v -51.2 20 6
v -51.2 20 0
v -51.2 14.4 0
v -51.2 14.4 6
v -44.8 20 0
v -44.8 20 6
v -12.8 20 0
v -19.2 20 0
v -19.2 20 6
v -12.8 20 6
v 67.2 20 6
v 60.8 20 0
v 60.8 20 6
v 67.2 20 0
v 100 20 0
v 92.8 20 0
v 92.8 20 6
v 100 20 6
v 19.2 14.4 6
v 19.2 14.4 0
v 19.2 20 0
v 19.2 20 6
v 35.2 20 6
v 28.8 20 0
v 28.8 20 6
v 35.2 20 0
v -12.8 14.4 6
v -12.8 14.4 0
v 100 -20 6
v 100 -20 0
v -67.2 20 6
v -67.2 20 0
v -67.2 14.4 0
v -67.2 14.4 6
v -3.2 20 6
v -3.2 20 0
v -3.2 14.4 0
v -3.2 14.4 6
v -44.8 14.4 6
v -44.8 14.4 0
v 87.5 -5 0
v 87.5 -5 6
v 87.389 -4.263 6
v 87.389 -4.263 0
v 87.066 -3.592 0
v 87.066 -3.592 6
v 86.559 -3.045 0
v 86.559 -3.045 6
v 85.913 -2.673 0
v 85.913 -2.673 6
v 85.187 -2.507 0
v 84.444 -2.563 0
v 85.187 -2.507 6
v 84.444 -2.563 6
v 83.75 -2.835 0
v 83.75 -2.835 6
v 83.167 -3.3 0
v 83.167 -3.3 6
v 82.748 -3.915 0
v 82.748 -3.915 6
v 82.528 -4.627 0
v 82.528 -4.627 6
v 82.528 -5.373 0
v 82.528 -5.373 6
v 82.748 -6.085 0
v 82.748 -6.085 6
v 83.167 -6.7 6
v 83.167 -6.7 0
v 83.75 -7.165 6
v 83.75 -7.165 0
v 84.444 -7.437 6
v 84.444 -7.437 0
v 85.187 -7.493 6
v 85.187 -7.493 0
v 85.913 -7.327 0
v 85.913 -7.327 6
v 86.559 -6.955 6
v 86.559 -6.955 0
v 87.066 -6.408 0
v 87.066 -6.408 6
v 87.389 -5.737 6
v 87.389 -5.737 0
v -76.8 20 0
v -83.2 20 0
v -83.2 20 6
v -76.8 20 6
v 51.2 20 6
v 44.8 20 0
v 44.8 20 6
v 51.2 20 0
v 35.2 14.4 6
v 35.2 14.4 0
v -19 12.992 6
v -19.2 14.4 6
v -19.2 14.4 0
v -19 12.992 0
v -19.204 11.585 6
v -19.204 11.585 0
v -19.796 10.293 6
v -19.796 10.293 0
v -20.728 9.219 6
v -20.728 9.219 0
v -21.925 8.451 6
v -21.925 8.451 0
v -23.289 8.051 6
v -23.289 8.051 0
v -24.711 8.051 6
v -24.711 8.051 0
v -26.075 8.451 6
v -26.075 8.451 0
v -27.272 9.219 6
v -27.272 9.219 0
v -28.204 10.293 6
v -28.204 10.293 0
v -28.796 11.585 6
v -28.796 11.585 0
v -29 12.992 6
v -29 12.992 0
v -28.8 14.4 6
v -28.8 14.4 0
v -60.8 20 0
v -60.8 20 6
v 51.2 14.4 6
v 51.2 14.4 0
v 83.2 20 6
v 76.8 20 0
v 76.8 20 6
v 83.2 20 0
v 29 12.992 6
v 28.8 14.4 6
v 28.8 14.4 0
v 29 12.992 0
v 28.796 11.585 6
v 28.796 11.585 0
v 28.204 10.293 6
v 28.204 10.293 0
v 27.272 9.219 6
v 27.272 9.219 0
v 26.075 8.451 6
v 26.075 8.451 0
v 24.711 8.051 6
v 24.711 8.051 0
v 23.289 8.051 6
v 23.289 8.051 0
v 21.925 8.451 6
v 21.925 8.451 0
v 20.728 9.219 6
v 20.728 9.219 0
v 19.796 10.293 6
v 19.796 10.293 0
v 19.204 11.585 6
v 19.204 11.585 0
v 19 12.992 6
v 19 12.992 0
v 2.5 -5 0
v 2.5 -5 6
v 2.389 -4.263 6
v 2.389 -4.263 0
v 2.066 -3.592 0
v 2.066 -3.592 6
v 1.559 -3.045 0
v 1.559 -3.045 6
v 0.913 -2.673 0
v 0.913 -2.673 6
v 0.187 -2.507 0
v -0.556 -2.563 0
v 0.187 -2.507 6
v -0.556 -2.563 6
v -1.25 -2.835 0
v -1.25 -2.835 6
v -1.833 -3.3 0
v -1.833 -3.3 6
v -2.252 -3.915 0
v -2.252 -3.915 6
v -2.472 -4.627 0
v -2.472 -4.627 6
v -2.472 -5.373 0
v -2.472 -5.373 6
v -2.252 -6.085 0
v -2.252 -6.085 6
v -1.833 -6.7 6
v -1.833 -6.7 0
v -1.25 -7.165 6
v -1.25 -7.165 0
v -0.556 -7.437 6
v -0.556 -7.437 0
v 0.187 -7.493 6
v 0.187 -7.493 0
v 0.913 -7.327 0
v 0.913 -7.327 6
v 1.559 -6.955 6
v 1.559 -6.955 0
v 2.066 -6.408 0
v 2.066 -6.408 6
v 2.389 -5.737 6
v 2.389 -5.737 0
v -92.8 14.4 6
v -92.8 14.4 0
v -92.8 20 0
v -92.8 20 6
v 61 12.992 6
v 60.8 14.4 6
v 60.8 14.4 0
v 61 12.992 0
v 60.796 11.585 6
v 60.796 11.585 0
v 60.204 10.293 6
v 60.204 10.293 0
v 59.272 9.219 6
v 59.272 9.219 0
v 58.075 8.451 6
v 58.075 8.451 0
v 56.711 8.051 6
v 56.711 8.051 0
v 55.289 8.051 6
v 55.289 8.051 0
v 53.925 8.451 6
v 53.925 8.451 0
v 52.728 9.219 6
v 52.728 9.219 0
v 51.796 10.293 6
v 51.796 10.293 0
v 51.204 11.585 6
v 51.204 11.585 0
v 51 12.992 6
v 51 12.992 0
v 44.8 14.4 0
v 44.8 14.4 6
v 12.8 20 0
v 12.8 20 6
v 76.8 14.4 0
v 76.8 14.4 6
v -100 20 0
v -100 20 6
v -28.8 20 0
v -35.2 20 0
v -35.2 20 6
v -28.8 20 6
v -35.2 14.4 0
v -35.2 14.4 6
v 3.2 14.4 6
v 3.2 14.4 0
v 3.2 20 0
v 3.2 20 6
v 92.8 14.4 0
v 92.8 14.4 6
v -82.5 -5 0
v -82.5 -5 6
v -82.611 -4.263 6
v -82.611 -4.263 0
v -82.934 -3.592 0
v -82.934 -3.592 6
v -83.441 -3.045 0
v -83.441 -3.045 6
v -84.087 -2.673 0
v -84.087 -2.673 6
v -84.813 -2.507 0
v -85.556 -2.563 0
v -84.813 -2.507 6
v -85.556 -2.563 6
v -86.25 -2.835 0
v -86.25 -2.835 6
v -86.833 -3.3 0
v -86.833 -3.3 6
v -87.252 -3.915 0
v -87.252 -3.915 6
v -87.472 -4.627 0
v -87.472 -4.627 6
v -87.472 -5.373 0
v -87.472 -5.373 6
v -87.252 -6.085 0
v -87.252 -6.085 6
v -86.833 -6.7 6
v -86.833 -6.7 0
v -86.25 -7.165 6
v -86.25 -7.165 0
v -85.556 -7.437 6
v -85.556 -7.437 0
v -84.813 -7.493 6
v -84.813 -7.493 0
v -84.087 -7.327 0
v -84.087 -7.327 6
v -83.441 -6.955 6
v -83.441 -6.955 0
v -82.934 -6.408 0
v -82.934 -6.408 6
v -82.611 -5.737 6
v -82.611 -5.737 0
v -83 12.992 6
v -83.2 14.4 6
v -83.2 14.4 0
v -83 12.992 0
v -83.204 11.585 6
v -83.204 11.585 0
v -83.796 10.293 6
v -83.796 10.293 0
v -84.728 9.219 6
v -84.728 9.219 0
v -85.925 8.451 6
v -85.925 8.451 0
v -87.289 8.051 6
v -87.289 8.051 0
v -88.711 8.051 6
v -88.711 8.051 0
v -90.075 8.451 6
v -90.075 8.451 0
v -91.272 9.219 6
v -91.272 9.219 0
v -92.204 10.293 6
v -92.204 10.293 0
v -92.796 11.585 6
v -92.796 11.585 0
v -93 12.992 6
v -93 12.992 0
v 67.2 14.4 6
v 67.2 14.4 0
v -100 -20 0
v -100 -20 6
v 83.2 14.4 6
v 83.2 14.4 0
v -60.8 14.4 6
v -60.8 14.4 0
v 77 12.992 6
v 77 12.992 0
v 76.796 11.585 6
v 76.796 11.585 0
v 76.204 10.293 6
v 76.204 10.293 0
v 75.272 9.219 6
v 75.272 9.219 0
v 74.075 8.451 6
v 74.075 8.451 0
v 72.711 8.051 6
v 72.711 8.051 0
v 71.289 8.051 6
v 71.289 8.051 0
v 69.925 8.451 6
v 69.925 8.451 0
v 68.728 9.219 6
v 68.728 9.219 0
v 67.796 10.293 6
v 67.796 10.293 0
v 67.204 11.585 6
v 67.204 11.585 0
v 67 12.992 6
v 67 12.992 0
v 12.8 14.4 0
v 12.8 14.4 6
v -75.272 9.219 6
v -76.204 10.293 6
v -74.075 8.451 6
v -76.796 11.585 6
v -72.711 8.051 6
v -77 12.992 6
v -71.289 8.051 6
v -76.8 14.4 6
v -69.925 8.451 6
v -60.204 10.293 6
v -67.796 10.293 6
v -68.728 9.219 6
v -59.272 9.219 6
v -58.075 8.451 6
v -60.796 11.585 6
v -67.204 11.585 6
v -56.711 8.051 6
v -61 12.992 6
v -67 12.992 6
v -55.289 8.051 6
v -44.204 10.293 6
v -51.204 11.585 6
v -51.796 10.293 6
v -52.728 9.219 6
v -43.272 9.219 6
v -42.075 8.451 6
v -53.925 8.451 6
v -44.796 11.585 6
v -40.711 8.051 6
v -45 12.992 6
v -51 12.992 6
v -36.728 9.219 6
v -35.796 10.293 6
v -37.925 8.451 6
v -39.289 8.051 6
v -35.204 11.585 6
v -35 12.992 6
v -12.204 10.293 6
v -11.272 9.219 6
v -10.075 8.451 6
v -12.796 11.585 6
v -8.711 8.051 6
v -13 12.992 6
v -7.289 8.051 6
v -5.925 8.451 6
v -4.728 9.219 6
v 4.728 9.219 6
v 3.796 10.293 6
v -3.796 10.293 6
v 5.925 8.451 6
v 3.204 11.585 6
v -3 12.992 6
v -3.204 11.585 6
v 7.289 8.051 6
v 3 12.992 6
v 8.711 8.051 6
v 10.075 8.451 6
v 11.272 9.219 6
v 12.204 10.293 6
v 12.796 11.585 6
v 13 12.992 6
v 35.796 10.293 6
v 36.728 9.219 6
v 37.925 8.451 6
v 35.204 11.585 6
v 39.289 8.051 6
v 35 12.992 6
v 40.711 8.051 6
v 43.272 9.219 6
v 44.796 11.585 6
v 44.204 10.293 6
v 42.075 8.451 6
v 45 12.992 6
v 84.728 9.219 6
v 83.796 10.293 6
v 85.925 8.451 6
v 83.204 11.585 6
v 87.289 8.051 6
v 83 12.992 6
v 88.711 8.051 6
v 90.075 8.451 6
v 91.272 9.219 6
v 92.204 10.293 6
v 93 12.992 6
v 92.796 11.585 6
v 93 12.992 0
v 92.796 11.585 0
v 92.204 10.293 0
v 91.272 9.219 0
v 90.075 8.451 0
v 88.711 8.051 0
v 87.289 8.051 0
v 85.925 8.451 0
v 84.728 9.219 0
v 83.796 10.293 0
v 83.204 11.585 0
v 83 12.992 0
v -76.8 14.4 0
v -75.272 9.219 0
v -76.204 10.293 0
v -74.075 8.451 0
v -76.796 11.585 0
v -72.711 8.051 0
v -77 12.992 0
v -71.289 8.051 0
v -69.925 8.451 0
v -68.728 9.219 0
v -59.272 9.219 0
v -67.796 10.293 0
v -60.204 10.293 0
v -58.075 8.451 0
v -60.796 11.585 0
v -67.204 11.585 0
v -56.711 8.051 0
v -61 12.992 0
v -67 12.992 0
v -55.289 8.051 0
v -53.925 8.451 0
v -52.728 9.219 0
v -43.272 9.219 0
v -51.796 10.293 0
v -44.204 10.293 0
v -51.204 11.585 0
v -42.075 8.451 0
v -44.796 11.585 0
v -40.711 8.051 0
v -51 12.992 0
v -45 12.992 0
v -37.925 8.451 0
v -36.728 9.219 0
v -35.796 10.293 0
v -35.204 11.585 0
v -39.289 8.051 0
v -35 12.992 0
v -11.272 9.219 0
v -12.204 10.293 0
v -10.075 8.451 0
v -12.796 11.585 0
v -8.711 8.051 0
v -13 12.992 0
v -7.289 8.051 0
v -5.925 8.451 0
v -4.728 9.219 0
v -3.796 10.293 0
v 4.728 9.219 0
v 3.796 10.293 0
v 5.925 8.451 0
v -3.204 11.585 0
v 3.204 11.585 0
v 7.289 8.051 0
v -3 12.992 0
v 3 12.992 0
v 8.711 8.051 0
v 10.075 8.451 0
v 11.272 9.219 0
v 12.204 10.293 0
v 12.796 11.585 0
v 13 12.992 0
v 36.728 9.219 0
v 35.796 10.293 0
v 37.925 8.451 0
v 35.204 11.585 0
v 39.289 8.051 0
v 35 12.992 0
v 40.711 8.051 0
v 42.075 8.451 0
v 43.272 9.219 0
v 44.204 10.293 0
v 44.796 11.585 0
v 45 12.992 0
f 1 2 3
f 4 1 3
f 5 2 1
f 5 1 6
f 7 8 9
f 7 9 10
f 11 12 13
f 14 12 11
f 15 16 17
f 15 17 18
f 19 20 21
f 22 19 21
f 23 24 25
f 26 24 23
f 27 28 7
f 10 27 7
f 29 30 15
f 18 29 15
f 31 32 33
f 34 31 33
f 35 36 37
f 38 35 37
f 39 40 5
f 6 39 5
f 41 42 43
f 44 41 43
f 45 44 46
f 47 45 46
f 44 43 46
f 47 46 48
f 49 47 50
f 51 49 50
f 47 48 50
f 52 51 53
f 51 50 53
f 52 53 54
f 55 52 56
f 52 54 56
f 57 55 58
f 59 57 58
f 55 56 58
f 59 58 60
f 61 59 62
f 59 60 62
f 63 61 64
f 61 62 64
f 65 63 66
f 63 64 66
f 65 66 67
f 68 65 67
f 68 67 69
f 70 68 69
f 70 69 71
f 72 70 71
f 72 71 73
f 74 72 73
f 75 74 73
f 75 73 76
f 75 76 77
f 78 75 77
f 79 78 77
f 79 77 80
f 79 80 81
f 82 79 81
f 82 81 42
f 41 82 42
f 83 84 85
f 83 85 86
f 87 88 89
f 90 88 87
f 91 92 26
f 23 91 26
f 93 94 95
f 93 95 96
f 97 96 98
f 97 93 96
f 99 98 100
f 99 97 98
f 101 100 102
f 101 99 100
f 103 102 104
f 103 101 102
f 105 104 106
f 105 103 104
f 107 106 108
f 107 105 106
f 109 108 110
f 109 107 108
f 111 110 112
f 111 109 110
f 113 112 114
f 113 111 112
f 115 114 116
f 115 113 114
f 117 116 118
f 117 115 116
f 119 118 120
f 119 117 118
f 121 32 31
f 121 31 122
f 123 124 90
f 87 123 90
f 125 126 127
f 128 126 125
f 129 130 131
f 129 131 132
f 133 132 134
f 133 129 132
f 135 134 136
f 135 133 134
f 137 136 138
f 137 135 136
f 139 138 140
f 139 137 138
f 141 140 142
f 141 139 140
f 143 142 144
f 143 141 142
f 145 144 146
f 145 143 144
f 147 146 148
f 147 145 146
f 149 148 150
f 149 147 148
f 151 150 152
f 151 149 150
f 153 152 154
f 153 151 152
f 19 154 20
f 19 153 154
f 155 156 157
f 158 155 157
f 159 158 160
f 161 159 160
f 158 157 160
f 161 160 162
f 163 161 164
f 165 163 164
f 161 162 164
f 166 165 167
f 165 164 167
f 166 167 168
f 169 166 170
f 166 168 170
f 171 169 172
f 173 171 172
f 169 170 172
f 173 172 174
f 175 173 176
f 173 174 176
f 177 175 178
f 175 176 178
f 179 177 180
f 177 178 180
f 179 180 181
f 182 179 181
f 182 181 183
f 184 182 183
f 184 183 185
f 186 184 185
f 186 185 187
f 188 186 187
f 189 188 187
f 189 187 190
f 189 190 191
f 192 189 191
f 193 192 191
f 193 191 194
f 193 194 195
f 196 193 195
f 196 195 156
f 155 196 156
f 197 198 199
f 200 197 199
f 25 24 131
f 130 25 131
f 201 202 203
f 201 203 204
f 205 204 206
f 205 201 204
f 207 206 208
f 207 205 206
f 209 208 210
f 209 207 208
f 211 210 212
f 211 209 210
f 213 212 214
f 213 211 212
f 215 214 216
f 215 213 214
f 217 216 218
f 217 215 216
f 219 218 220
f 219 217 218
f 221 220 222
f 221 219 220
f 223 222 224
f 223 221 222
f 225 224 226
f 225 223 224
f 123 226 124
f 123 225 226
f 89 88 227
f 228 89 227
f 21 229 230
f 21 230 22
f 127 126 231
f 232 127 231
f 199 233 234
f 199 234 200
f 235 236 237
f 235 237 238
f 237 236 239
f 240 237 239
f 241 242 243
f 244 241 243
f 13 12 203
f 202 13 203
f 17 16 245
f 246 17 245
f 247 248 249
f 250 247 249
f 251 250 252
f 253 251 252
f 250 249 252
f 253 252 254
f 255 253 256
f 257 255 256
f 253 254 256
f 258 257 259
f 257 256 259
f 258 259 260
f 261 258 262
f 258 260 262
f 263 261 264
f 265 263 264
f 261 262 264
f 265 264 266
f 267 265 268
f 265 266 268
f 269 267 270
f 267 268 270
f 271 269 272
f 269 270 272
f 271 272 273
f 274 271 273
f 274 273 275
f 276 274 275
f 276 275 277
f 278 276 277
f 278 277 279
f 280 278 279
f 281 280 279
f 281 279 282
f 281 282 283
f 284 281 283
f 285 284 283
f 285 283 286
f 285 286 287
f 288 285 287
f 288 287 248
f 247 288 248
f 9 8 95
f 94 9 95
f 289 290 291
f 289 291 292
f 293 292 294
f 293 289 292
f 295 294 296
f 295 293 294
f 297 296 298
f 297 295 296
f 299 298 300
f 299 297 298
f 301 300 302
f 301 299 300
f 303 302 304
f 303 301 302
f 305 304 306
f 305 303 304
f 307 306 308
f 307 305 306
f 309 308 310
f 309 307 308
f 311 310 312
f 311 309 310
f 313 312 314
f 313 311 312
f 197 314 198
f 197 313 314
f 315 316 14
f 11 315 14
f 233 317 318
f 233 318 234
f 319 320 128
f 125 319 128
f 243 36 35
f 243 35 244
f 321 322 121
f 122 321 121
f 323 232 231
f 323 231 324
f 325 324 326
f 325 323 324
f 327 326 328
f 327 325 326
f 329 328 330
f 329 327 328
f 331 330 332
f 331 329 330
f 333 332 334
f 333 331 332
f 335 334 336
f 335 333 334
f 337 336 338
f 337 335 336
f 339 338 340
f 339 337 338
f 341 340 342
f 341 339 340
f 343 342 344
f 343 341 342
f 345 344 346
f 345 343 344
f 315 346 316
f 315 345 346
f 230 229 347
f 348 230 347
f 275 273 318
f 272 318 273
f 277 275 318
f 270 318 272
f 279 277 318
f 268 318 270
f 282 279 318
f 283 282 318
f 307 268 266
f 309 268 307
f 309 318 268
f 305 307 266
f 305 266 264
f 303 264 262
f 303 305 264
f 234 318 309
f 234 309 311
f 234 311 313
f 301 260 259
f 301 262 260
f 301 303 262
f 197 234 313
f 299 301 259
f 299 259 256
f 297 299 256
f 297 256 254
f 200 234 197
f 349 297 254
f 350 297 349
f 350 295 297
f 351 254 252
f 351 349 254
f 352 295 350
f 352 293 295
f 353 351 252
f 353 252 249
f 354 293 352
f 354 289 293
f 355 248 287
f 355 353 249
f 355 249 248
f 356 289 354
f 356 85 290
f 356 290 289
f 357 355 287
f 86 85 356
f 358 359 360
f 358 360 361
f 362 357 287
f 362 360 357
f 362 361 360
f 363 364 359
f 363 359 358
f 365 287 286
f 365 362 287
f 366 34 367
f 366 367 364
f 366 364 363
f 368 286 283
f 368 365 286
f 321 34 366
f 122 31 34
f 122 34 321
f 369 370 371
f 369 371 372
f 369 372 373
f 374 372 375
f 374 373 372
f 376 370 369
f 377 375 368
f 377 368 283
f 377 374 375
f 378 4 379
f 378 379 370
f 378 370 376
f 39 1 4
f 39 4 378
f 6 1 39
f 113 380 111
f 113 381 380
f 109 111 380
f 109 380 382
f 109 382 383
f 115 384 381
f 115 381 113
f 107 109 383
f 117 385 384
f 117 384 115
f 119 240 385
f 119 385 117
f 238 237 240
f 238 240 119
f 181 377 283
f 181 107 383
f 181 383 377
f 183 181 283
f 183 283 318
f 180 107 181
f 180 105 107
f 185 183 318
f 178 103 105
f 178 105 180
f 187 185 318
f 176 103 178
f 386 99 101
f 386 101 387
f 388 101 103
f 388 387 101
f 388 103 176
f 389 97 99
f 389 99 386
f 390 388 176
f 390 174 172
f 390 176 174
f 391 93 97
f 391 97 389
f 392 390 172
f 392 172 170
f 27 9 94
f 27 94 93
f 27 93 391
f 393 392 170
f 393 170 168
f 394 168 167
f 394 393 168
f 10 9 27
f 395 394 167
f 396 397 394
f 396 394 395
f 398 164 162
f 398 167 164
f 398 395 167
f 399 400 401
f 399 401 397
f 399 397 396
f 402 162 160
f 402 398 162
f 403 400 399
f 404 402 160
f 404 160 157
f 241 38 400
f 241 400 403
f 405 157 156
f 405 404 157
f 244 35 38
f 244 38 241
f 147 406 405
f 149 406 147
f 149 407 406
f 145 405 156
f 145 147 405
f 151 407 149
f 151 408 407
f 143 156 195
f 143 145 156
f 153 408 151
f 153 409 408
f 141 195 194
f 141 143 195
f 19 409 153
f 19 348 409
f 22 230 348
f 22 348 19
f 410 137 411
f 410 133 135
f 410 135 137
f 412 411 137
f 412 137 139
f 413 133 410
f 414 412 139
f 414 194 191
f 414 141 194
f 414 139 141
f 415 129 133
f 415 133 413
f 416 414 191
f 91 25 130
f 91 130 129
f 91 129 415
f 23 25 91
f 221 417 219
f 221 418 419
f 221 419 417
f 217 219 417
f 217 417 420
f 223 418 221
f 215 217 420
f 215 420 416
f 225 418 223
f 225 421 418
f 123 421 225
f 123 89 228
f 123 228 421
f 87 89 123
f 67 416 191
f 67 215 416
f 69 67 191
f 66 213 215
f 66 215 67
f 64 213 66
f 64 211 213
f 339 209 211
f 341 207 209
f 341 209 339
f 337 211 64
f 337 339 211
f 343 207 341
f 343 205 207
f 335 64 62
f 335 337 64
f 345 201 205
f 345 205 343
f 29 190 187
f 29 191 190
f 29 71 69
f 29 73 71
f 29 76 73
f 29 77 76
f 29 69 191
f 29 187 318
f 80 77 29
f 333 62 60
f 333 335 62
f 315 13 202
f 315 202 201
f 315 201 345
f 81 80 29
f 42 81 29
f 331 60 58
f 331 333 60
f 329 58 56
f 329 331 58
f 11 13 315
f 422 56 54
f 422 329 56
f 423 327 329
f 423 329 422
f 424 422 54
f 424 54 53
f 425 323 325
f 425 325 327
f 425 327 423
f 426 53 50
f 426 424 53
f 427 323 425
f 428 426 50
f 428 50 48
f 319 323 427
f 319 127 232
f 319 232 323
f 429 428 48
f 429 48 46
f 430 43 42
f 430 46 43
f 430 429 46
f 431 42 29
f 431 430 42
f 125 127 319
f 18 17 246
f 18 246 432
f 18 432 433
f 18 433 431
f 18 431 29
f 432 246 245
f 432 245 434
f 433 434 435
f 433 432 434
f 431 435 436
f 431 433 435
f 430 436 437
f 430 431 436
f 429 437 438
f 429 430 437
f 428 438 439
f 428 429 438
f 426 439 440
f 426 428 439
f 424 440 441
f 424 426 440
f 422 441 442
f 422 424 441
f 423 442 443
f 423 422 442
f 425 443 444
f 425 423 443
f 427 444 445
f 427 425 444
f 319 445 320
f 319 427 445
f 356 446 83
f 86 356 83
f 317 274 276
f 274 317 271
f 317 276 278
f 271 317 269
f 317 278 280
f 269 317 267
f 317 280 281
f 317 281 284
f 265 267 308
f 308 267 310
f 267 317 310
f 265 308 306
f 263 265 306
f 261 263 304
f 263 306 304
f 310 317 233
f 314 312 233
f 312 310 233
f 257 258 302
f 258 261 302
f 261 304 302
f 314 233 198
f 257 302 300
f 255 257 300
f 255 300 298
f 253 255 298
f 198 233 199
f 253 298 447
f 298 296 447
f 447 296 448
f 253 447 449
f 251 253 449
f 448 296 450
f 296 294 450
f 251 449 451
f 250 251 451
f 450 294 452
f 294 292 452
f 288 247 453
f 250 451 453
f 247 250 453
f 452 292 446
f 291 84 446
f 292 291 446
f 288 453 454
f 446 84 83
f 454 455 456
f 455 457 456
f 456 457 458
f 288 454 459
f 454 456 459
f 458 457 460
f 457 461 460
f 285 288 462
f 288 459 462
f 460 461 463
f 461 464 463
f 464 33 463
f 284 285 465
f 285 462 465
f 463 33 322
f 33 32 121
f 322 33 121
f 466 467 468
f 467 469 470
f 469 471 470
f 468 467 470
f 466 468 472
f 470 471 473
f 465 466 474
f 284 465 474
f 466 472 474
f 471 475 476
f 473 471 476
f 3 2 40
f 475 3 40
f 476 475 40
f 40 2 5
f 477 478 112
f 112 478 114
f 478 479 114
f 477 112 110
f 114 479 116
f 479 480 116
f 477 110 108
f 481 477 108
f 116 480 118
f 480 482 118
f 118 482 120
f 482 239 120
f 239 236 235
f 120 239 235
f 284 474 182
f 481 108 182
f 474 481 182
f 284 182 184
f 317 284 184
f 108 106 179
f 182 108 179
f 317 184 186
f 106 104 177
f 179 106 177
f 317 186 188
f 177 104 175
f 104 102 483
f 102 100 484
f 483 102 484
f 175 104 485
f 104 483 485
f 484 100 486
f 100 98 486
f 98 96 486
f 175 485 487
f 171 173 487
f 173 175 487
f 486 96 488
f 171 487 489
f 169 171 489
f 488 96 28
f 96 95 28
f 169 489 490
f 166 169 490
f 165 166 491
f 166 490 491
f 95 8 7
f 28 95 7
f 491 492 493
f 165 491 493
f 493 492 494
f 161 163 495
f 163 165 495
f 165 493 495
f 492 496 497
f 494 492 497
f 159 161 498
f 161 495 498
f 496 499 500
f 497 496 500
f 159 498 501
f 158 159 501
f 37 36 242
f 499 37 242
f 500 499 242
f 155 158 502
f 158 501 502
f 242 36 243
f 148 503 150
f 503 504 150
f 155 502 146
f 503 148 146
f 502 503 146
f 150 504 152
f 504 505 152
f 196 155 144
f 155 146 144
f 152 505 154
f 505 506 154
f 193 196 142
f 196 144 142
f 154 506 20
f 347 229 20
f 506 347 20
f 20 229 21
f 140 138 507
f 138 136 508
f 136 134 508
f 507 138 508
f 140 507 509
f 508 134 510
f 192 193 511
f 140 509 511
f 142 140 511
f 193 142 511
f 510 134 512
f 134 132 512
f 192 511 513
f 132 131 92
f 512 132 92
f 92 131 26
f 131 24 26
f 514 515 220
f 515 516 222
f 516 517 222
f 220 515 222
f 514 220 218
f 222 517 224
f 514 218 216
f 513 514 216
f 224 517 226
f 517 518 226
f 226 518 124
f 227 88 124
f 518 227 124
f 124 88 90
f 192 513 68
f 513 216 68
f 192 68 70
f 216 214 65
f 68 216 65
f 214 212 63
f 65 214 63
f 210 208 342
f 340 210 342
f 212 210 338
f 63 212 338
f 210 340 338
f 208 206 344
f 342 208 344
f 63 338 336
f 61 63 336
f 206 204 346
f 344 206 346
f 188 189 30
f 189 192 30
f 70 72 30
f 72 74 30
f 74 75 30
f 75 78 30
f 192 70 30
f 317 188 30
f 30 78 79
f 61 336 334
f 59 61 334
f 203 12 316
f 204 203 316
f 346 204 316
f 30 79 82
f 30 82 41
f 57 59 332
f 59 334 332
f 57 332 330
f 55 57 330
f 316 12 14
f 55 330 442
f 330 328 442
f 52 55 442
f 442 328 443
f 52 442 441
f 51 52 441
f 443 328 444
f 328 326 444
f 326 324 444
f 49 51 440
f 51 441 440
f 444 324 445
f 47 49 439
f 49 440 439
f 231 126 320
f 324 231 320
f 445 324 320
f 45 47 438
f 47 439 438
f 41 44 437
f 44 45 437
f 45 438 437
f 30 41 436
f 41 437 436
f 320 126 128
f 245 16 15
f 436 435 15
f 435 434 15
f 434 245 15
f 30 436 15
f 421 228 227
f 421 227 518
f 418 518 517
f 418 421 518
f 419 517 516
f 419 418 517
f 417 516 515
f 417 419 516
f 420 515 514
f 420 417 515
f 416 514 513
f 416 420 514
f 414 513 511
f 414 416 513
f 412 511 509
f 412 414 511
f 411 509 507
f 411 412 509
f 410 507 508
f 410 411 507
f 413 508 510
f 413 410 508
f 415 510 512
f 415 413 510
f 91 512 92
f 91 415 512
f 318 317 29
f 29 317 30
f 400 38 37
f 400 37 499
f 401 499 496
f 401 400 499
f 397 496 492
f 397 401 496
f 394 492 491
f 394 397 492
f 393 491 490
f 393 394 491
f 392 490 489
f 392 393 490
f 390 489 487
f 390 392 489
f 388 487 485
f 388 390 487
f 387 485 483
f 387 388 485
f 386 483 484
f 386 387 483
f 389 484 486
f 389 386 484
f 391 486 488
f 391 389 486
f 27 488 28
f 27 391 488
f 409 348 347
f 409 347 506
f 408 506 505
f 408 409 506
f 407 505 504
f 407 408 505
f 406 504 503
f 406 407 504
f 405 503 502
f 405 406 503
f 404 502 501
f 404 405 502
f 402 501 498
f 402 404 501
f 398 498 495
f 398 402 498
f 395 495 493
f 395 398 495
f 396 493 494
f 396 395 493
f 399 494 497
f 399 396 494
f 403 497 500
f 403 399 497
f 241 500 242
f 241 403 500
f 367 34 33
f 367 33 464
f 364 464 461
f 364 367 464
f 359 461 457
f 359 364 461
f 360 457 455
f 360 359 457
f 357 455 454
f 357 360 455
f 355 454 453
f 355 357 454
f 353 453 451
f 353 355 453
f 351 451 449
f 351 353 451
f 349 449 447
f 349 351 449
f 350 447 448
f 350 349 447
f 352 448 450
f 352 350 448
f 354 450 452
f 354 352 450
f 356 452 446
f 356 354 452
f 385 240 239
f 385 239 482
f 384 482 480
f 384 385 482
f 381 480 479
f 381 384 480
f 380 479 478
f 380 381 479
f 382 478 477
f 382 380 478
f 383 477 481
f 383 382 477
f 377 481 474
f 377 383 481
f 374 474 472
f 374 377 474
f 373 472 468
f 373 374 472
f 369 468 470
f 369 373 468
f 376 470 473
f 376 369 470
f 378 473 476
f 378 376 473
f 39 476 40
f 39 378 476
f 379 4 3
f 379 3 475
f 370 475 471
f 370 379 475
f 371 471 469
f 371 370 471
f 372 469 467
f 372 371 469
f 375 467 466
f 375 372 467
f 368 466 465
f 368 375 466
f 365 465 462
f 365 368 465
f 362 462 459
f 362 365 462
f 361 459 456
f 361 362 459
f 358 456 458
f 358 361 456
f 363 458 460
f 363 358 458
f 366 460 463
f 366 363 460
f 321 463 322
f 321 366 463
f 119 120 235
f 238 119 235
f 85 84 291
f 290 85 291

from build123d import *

# Parameters (mm, degrees)
ESQUISSE1_W                = 200
ESQUISSE1_H                = 40
BOSS_EXTRU_1_DEPTH         = 6
ENL_V_MAT_EXTRU_1_DEPTH    = 103.156742313
ESQUISSE3_R                = 2.5
ENL_V_MAT_EXTRU_2_DEPTH    = 103.156742313
R_P_TITION_LIN_AIRE1_COUNT = 12
R_P_TITION_LIN_AIRE1_PITCH = 16


with BuildPart() as part:
    # Esquisse1 → Boss.-Extru.1 (new body)
    with BuildSketch(Plane.XY):
        Rectangle(ESQUISSE1_W, ESQUISSE1_H)
    extrude(amount=BOSS_EXTRU_1_DEPTH)

    # Esquisse2 → Enlèv. mat.-Extru.1 (cut, through all)
    with BuildSketch(Plane.XY.offset(6)):
        with BuildLine():
            Line((-92.8, 14.4), (-92.8, 20))
            Line((-92.8, 20), (-83.2, 20))
            Line((-83.2, 20), (-83.2, 14.4))
            ThreePointArc((-83.2, 14.4), (-88, 8), (-92.8, 14.4))
        make_face()
    enl_v_mat_extru_1 = extrude(amount=-ENL_V_MAT_EXTRU_1_DEPTH, mode=Mode.SUBTRACT)

    # Esquisse3 → Enlèv. mat.-Extru.2 (cut, through all)
    with BuildSketch(Plane.XY.offset(6)):
        with Locations((-85, -5)):
            Circle(ESQUISSE3_R)
        with Locations((85, -5)):
            Circle(ESQUISSE3_R)
        with Locations((0, -5)):
            Circle(ESQUISSE3_R)
    extrude(amount=-ENL_V_MAT_EXTRU_2_DEPTH, mode=Mode.SUBTRACT)

    # Répétition linéaire1: Enlèv. mat.-Extru.1 ×12
    with Locations(*[(i * R_P_TITION_LIN_AIRE1_PITCH, 0, 0) for i in range(1, R_P_TITION_LIN_AIRE1_COUNT)]):
        add(enl_v_mat_extru_1, mode=Mode.SUBTRACT)


solid = part.part
